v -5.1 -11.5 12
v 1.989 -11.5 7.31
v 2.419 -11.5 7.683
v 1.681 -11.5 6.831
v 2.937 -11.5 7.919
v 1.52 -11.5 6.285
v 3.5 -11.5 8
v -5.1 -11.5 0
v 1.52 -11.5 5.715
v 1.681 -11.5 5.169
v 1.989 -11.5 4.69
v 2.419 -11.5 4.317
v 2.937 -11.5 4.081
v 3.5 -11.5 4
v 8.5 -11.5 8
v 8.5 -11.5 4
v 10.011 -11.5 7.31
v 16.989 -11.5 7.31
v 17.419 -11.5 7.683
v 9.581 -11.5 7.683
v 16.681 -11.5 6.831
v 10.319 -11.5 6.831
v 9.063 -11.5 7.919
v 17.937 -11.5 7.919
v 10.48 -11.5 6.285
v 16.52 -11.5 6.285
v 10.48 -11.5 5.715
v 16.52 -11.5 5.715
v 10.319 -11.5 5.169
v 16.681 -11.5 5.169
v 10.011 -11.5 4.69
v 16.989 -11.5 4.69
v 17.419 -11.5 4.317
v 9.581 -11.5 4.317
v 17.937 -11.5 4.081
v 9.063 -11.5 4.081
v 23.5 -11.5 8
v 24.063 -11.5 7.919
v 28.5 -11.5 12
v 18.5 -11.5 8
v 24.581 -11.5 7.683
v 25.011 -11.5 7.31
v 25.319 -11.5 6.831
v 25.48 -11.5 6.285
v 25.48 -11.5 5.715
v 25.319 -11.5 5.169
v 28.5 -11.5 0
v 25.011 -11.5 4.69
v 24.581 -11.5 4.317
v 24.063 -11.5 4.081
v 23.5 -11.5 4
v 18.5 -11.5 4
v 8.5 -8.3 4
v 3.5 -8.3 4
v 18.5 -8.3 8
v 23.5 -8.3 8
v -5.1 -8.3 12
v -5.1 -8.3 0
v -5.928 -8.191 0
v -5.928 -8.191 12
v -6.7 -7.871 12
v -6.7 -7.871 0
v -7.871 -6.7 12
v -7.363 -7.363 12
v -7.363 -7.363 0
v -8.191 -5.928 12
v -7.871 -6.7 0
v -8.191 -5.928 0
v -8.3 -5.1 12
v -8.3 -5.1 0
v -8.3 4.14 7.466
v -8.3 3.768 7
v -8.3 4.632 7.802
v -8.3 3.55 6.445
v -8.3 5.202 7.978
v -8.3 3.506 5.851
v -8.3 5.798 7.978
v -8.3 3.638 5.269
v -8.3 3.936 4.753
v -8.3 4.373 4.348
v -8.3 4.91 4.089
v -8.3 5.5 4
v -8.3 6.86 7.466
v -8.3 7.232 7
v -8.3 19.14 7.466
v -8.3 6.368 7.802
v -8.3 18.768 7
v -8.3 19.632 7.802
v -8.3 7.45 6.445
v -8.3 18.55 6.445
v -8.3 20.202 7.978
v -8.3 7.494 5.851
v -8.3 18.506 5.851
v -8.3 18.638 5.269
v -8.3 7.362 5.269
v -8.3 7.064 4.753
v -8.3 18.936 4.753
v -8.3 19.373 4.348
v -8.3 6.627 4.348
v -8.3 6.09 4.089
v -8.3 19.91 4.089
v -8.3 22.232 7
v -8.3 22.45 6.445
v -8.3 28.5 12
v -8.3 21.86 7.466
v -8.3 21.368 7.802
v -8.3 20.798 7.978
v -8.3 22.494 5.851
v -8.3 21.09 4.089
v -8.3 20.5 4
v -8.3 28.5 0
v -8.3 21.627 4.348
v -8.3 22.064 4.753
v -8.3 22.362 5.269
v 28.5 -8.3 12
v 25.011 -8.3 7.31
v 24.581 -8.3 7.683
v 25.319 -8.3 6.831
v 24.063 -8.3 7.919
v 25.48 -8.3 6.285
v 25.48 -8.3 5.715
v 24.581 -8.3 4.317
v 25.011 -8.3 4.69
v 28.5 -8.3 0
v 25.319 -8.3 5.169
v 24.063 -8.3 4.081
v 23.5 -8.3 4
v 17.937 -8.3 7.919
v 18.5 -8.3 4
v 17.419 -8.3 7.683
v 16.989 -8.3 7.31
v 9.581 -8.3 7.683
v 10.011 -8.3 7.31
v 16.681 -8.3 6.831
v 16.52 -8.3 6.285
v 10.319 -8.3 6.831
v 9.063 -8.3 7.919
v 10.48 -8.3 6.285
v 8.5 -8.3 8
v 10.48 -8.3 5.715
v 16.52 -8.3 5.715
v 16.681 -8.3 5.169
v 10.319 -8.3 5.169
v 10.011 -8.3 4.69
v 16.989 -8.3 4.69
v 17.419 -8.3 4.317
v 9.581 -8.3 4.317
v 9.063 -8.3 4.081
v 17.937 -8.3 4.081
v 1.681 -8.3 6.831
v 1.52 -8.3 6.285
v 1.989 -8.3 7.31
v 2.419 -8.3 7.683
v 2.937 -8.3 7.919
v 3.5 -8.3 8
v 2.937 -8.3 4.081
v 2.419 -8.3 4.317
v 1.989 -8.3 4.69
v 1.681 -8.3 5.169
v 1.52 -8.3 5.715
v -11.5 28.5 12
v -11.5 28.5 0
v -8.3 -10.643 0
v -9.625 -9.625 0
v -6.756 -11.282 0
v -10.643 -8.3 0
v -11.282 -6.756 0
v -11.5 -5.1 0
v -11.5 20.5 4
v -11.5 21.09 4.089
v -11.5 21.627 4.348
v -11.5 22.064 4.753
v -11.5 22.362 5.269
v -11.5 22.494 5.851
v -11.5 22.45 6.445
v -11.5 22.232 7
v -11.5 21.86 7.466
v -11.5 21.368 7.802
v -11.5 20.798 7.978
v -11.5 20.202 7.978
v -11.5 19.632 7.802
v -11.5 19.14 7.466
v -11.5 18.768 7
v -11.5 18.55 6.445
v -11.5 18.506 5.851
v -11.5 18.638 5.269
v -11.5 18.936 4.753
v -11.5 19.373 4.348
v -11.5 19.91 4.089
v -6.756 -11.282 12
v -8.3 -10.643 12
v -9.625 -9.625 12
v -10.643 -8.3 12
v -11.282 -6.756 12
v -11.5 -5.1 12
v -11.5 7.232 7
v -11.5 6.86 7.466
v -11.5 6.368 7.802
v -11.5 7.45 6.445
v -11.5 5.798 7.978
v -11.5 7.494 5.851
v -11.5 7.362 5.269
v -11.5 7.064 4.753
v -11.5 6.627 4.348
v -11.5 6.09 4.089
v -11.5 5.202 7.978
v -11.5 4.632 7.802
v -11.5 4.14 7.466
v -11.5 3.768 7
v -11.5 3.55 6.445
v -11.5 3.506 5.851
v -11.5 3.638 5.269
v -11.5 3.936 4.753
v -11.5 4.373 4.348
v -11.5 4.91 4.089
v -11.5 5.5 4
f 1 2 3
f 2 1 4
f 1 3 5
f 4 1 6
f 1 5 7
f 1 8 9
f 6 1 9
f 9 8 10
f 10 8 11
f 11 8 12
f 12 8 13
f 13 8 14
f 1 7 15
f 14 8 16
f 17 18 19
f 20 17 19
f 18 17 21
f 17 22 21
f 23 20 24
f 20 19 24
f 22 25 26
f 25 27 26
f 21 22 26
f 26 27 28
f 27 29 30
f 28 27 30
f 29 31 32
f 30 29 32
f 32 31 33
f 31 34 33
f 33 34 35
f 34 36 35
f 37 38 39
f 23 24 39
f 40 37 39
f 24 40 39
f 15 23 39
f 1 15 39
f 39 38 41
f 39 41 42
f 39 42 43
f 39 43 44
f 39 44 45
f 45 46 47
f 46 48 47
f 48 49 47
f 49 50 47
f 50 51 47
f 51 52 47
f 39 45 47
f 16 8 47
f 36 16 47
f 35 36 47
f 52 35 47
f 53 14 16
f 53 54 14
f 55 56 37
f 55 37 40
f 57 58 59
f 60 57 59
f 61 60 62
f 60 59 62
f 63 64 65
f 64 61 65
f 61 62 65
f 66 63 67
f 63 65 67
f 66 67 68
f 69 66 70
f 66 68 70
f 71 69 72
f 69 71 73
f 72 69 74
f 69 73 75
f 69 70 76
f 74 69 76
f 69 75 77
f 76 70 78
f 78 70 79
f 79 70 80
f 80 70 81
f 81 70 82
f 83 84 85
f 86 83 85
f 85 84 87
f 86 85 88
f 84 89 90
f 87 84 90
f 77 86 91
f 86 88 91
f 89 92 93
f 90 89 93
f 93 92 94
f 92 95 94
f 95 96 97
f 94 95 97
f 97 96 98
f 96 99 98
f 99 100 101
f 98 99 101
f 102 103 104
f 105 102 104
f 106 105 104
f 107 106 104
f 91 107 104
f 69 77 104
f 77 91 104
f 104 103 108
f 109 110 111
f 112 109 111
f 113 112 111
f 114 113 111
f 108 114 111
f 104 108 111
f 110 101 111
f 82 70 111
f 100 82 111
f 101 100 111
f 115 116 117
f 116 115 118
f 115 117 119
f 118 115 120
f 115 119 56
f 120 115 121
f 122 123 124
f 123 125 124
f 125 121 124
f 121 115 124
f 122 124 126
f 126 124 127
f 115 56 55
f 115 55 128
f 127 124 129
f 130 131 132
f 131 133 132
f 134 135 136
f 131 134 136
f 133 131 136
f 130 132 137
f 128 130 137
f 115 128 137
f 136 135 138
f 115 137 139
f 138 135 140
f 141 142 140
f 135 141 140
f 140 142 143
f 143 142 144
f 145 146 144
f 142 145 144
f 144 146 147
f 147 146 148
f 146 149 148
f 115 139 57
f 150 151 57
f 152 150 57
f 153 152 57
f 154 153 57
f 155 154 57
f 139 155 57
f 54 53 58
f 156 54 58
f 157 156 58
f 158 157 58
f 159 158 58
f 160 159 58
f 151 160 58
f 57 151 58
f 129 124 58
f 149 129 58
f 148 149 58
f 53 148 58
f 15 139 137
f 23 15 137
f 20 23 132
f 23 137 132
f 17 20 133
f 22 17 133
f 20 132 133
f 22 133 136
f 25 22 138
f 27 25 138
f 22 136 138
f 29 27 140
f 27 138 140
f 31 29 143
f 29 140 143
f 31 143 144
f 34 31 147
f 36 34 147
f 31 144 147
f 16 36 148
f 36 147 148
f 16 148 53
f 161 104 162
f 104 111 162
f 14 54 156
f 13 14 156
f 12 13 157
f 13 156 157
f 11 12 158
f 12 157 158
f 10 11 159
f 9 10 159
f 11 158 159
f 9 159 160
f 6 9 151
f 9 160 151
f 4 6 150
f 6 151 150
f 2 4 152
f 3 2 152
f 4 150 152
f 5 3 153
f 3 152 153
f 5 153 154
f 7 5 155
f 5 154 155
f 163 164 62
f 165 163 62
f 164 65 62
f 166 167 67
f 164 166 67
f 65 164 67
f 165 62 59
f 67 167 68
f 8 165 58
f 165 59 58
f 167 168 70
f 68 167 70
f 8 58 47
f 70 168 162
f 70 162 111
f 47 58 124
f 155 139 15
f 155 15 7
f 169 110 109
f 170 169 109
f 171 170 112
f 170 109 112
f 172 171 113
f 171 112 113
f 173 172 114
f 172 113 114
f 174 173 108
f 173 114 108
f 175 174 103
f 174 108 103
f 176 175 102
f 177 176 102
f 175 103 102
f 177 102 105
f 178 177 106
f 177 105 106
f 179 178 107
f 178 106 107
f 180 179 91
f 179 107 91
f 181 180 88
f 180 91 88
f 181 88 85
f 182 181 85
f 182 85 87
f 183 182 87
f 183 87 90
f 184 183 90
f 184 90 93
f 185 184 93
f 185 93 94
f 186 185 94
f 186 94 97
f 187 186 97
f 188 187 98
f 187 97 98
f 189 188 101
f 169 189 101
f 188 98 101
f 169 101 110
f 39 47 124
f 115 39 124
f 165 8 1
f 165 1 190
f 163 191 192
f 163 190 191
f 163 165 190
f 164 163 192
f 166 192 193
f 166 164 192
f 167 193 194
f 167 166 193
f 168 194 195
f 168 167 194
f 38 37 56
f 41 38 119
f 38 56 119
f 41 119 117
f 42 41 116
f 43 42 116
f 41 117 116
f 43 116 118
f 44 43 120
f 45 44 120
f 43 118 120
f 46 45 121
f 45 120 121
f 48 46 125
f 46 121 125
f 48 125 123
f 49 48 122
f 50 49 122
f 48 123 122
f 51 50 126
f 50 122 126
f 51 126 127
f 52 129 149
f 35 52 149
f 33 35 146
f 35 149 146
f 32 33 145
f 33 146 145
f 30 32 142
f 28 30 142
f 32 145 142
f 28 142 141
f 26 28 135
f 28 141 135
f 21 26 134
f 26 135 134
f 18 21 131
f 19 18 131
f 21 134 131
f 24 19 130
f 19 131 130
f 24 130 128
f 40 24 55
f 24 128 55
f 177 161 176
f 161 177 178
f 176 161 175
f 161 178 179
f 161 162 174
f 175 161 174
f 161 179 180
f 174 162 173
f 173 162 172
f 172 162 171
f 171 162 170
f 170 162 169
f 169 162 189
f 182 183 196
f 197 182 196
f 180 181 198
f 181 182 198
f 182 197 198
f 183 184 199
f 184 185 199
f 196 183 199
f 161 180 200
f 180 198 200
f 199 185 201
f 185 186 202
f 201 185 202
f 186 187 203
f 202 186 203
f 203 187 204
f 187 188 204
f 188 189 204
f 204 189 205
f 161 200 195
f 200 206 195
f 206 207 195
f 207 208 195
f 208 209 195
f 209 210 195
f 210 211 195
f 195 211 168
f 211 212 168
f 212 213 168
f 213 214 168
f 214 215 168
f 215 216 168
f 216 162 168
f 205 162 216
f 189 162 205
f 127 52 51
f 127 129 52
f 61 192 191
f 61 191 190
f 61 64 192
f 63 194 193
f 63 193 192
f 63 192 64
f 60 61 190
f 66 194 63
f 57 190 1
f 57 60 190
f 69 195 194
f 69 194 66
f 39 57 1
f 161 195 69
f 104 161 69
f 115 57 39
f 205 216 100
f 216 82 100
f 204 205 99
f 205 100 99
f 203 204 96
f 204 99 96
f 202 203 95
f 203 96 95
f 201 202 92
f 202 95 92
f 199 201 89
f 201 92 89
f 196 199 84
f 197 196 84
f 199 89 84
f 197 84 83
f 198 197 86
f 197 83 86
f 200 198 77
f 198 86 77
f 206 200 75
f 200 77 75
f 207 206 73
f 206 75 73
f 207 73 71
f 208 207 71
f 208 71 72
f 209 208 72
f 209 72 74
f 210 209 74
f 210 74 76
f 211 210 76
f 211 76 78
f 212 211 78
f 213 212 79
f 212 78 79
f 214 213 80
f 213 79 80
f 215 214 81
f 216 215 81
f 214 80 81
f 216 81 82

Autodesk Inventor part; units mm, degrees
ref_plane "YZ Plane" through (0, 0, 0) normal (1, 0, 0) x (0, 1, 0)
ref_plane "Start plane" through (0, 0, 0) normal (0, 0, 1) x (1, 0, 0)
ref_plane "End plane" through (0, 0, 12) normal (0, 0, 1) x (1, 0, 0)
sketch "Sketch2" plane through (0, 0, 0) normal (0, 0, 1) x (1, 0, 0)
  line L0 (-8.3, 28.5) -> (-11.5, 28.5)
  line L1 (-8.3, -5.1) -> (-8.3, 28.5)
  line L2 (28.5, -8.3) -> (-5.1, -8.3)
  line L3 (28.5, -11.5) -> (28.5, -8.3)
  line L4 (-5.1, -11.5) -> (28.5, -11.5)
  line L5 (-11.5, 28.5) -> (-11.5, -5.1)
  arc A0 (-8.3, -5.1) -> (-5.1, -8.3) centre (-5.1, -5.1) ccw
  arc A1 (-11.5, -5.1) -> (-5.1, -11.5) centre (-5.1, -5.1) ccw
  line L6 (0, 72.2651) -> (0, -13.5906) construction
  line L7 (-13.5906, 0) -> (72.2651, 0) construction
  point P0 (-8.3, -8.3)
  point P1 (-11.5, -11.5)
  dimension "d1" = 3.2
  dimension "d3" = 3.2
  dimension "d5" = 40
  dimension "d7" = 40
  dimension "d12" = 3.2
  dimension "d13" = 6.4
  dimension "d16" = 11.5
  dimension "d17" = 11.5
extrude "Body" add sketch "Sketch2" along normal up to surface (12 mm away) from surface at 0
sketch "Sketch3" plane through (0, 0, 0) normal (0, 0, 1) x (1, 0, 0)
  line L0 (0, 0) -> (10, 0)
ref_plane "Work Plane4" through (0, 0, 0) normal (0, -1, 0) x (1, 0, 0)
sketch "Sketch4" plane through (0, 0, 0) normal (0, -1, 0) x (1, 0, 0)
  line L0 (-2, 0) -> (12, 0)
  line L1 (-2, 12) -> (12, 12)
  dimension "d21" = 12
sketch "Sketch5" plane through (-8.3, -5.1, 12) normal (1, 0, 0) x (0, 0, -1)
  circle A0 centre (6, 10.6) radius 2
  line L0 (12, 33.6) -> (0, 33.6) projected
  line L1 (6, 33.6) -> (6, -25.4884) construction
  circle A1 centre (6, 25.6) radius 2
  line L2 (12, 0) -> (0, 0) projected
  line L3 (0, 0) -> (22.22, 0) construction
  point P0 (12, 5.1)
  dimension "d22" = 4
  dimension "d25" = 15
  dimension "d30" = 8
extrude "Extrusion2" cut sketch "Sketch5" against normal through all
sketch "Sketch6" plane through (28.5, -8.3, 12) normal (0, 1, 0) x (1, 0, 0)
  circle A0 centre (-5, 6) radius 2
  line L0 (0, 12) -> (0, 0) projected
  line L1 (0, 6) -> (-67.1079, 6) construction
  circle A1 centre (-10, 6) radius 2
  line L2 (-5, 4) -> (-10, 4)
  line L3 (-10, 4) -> (-10, 8)
  line L4 (-10, 8) -> (-5, 8)
  line L5 (-5, 8) -> (-5, 4)
  line L6 (0, 12) -> (0, 0) projected
  line L7 (0, 0) -> (-33.6, 0) projected
  line L8 (-33.6, 0) -> (-33.6, 12) projected
  line L9 (-39.1426, 12) -> (-33.6, 12) projected
  line L10 (-39.1426, 0) -> (-39.1426, 12) projected
  line L11 (-33.6, 0) -> (-39.1426, 0) projected
  line L12 (-33.6, 12) -> (0, 12) projected
  circle A2 centre (-20, 6) radius 2
  circle A3 centre (-25, 6) radius 2
  line L13 (-20, 4) -> (-25, 4)
  line L14 (-25, 4) -> (-25, 8)
  line L15 (-25, 8) -> (-20, 8)
  line L16 (-20, 8) -> (-20, 4)
  point P0 (-28.5, 12)
  dimension "d33" = 4
  dimension "d36" = 5
  dimension "d43" = 15
  dimension "d48" = 5
extrude "Extrusion3" cut sketch "Sketch6" against normal through all contours A0 L5 | L5 A0 | A0 L2 A1 L4 | L3 A1 | A1 L3 | A2 L16 | L16 A2 | A2 L13 A3 L15 | L14 A3 | A3 L14
equation "\"d1\" = ParT"
equation "\"d3\" = ParT"
equation "\"d5\" = b"
equation "\"d7\" = ParH"
equation "\"d12\" = ParT"
equation "\"d13\" = 2 * ParT"
equation "\"d16\" = ex"
equation "\"d17\" = ey"
equation "\"d8\" = G_L"
equation "\"ParT\" = 3.2"
equation "\"b\" = 40"
equation "\"ParH\" = 40"
equation "\"G_L\" = d21"
equation "\"ex\" = 11.5"
equation "\"ey\" = 11.5"
equation "\"G_OFFSET_START\" = 0"
equation "\"G_OFFSET_END\" = 0"
equation "\"d19\" = G_OFFSET_END + B_L"
equation "\"B_L\" = 12"
properties part number "JIS G 3350C - 3075     40x40-12" material "Steel, Mild"
